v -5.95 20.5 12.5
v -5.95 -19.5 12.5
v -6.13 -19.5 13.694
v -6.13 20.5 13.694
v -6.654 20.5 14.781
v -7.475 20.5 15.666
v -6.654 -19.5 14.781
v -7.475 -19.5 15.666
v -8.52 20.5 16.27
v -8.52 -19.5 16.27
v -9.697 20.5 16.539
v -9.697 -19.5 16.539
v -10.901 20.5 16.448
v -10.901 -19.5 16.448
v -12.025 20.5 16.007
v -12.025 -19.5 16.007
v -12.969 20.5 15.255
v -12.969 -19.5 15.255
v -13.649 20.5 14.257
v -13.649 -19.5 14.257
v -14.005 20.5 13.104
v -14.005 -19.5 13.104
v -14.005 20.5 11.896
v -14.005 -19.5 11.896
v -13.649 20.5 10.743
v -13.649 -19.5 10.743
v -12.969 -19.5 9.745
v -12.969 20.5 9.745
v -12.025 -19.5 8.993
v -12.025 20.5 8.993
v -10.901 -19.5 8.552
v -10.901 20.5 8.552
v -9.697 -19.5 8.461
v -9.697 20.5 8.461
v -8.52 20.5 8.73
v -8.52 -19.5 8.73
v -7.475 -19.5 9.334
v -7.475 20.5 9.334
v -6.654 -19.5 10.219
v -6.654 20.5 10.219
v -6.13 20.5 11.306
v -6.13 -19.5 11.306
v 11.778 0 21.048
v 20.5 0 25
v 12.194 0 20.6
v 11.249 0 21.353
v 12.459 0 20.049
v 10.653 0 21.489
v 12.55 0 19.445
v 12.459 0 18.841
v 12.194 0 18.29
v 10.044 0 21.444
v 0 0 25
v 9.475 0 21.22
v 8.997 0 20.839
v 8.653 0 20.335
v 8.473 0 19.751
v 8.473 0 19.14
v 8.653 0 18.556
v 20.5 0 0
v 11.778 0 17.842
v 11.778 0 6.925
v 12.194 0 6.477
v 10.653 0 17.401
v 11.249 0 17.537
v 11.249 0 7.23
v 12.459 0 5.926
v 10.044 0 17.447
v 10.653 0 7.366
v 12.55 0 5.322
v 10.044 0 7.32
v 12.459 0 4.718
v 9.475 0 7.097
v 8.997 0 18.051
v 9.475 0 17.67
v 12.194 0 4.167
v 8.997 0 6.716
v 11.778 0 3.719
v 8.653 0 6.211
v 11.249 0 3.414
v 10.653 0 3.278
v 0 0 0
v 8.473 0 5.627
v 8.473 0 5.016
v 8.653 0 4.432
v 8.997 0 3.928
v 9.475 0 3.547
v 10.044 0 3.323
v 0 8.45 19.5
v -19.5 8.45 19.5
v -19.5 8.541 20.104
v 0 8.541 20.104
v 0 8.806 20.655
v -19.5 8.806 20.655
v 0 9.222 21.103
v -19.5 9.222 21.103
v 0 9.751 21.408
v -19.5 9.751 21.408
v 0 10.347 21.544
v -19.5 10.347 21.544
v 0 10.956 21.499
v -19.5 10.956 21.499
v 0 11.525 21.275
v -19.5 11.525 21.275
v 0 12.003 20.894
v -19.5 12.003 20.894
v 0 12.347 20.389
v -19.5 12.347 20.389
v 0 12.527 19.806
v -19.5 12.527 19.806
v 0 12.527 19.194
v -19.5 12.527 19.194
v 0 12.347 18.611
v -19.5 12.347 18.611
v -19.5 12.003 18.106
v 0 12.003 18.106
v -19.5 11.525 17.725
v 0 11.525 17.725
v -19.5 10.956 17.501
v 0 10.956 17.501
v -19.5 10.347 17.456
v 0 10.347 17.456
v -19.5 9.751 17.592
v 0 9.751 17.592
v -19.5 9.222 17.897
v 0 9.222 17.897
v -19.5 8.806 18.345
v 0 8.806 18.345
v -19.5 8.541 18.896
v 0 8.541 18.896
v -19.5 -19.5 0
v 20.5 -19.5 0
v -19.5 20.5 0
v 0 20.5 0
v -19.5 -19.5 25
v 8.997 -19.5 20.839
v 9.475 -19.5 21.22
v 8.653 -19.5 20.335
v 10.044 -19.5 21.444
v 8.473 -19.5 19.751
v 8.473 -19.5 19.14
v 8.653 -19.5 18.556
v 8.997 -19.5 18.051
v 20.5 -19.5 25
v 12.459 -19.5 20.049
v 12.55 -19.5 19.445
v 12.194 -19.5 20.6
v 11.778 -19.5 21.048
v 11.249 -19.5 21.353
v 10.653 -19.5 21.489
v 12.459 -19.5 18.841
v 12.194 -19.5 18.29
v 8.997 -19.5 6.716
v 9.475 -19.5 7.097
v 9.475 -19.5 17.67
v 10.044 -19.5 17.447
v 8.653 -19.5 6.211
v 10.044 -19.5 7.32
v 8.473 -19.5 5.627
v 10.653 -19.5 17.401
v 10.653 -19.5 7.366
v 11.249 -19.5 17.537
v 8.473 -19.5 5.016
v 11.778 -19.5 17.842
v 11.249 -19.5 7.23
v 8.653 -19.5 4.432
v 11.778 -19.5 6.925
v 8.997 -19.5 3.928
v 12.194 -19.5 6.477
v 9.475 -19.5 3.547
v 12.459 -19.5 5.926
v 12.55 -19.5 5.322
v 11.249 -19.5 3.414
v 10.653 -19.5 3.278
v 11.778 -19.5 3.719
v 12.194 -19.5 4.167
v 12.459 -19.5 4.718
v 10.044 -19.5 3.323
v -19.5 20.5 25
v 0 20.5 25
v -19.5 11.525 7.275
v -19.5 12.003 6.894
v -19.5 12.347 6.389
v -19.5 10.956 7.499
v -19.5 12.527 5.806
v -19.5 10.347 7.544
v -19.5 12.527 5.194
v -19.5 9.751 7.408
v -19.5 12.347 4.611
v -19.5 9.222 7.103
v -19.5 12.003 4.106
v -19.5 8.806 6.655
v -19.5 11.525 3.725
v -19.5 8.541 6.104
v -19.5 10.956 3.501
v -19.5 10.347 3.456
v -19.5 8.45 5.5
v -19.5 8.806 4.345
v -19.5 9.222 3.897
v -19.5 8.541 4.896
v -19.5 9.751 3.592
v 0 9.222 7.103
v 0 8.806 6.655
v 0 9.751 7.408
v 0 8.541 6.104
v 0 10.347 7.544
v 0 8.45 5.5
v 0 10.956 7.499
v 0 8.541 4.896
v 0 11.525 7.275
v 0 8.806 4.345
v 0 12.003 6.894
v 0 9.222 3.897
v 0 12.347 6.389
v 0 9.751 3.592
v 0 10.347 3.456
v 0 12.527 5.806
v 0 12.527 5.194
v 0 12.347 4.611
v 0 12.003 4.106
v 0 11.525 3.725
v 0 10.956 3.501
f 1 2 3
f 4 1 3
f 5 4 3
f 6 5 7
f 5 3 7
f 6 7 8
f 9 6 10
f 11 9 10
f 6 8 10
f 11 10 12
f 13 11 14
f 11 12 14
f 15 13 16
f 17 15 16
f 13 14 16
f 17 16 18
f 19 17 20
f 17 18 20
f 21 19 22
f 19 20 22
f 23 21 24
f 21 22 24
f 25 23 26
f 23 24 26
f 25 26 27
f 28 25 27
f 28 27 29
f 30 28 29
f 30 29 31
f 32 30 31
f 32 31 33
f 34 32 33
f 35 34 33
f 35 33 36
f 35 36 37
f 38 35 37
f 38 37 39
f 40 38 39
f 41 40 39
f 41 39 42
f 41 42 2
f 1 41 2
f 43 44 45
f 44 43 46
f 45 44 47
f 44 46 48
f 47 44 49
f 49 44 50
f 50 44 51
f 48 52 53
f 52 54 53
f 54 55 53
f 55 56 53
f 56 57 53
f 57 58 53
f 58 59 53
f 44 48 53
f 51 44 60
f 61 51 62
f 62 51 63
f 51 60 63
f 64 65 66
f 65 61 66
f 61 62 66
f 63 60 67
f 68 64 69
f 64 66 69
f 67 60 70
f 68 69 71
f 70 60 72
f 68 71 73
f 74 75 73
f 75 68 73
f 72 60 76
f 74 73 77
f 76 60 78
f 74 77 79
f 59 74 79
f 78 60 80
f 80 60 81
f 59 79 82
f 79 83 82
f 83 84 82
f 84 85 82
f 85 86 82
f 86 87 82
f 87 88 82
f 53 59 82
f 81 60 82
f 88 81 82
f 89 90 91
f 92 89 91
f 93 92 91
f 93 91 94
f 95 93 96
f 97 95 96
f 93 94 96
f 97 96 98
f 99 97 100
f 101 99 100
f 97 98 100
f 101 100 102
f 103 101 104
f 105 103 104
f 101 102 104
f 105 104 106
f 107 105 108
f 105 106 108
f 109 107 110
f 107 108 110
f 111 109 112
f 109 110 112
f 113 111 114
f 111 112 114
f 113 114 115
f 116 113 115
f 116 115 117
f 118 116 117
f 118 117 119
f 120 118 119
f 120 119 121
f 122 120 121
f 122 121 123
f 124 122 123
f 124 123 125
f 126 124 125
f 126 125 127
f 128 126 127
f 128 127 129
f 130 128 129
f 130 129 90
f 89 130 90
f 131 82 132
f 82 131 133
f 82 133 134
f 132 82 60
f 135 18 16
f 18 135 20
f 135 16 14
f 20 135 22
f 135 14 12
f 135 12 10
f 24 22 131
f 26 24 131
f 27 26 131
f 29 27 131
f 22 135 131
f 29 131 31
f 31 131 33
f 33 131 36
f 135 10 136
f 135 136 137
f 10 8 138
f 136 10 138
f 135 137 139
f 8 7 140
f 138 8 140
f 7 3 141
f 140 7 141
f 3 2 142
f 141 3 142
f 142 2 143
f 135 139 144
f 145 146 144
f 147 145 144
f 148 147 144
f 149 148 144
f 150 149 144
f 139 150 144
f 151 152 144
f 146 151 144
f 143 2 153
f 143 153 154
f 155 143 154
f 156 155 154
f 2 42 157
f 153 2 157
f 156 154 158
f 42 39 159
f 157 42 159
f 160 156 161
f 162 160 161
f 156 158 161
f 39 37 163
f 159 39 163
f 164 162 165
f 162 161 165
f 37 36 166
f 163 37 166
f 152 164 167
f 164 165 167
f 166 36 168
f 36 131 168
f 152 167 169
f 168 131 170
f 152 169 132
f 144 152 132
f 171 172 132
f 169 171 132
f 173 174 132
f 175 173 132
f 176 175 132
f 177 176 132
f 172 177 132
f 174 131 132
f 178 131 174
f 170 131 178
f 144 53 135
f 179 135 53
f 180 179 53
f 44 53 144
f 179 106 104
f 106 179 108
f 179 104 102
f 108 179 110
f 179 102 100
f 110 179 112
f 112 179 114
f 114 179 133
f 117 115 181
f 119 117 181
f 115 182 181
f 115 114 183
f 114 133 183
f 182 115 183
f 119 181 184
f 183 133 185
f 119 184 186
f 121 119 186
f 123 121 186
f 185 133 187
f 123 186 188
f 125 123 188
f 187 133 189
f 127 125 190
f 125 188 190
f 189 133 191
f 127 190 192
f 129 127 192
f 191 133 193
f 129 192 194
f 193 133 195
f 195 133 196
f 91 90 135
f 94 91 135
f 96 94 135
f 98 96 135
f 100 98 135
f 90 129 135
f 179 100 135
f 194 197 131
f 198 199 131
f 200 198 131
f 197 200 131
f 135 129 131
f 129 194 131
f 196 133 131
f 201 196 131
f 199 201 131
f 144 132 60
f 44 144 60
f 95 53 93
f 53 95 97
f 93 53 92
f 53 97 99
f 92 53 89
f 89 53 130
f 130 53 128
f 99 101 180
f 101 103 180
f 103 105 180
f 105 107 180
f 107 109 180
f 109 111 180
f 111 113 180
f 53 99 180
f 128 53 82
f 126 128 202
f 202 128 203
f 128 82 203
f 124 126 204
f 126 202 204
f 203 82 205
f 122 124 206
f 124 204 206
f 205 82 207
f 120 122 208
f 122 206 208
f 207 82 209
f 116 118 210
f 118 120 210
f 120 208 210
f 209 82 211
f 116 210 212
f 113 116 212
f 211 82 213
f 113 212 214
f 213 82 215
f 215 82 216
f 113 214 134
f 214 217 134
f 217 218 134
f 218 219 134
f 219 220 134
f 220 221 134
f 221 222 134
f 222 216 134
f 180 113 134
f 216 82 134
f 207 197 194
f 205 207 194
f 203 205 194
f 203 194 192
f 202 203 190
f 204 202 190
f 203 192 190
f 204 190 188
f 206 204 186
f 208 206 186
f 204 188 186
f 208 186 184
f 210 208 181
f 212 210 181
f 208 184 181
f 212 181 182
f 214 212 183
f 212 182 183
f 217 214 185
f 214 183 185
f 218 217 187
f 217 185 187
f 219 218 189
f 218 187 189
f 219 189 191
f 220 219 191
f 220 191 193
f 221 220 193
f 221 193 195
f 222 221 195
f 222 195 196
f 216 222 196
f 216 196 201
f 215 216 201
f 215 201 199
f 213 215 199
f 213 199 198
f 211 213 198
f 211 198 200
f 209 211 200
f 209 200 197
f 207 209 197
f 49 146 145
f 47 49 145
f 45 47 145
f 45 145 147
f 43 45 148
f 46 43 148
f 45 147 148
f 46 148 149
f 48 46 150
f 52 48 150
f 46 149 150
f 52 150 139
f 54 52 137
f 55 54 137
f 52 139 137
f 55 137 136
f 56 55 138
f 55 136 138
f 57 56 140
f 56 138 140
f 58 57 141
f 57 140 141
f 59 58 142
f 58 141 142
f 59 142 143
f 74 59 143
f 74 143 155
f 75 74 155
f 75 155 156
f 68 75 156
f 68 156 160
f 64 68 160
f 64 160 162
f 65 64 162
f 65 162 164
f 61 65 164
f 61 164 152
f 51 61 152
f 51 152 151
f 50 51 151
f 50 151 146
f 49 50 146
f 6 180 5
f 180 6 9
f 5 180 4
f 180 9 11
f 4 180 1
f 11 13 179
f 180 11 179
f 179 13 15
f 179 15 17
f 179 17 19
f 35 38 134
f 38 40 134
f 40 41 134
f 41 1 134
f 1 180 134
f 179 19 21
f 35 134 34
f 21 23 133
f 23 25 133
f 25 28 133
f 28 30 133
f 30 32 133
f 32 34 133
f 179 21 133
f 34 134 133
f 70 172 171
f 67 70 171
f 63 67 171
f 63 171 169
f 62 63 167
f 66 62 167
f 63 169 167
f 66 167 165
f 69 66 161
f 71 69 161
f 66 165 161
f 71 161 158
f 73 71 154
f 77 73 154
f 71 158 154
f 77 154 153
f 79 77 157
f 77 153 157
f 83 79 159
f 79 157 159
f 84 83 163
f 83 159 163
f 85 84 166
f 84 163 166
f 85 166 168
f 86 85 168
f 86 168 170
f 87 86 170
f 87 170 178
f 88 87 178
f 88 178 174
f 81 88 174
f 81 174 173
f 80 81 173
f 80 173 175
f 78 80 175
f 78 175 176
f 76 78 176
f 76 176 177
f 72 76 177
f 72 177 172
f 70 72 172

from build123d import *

# Parameters (mm, degrees)
F1_DEPTH = 25
F2_R     = 2.05
F2_R_2   = 4.05
F3_DEPTH = 45
F4_R     = 2.05
F5_DEPTH = 25


with BuildPart() as f1:
    # F0 (on Top) → F1 (new body)
    with BuildSketch(Plane.XY):
        Polygon((0, 20.5), (-19.5, 20.5), (-19.5, -19.5), (20.5, -19.5), (20.5, 0), (0, 0), align=None)
    extrude(amount=F1_DEPTH)

    # F2 (on face) → F3 (cut)
    with BuildSketch(Plane.XZ.offset(19.5)):
        with Locations((10.5, 19.445103)):
            Circle(F2_R)
        with Locations((10.5, 5.321864)):
            Circle(F2_R)
        with Locations((-10, 12.5)):
            Circle(F2_R_2)
    extrude(amount=-F3_DEPTH, mode=Mode.SUBTRACT)

    # F4 (on face) → F5 (cut)
    with BuildSketch(Plane(origin=(-19.5, 0, 0), x_dir=(0, -1, 0), z_dir=(-1, 0, 0))):
        with Locations((-10.5, 19.5)):
            Circle(F4_R)
        with Locations((-10.5, 5.5)):
            Circle(F4_R)
    extrude(amount=-F5_DEPTH, mode=Mode.SUBTRACT)


solid = f1.part
